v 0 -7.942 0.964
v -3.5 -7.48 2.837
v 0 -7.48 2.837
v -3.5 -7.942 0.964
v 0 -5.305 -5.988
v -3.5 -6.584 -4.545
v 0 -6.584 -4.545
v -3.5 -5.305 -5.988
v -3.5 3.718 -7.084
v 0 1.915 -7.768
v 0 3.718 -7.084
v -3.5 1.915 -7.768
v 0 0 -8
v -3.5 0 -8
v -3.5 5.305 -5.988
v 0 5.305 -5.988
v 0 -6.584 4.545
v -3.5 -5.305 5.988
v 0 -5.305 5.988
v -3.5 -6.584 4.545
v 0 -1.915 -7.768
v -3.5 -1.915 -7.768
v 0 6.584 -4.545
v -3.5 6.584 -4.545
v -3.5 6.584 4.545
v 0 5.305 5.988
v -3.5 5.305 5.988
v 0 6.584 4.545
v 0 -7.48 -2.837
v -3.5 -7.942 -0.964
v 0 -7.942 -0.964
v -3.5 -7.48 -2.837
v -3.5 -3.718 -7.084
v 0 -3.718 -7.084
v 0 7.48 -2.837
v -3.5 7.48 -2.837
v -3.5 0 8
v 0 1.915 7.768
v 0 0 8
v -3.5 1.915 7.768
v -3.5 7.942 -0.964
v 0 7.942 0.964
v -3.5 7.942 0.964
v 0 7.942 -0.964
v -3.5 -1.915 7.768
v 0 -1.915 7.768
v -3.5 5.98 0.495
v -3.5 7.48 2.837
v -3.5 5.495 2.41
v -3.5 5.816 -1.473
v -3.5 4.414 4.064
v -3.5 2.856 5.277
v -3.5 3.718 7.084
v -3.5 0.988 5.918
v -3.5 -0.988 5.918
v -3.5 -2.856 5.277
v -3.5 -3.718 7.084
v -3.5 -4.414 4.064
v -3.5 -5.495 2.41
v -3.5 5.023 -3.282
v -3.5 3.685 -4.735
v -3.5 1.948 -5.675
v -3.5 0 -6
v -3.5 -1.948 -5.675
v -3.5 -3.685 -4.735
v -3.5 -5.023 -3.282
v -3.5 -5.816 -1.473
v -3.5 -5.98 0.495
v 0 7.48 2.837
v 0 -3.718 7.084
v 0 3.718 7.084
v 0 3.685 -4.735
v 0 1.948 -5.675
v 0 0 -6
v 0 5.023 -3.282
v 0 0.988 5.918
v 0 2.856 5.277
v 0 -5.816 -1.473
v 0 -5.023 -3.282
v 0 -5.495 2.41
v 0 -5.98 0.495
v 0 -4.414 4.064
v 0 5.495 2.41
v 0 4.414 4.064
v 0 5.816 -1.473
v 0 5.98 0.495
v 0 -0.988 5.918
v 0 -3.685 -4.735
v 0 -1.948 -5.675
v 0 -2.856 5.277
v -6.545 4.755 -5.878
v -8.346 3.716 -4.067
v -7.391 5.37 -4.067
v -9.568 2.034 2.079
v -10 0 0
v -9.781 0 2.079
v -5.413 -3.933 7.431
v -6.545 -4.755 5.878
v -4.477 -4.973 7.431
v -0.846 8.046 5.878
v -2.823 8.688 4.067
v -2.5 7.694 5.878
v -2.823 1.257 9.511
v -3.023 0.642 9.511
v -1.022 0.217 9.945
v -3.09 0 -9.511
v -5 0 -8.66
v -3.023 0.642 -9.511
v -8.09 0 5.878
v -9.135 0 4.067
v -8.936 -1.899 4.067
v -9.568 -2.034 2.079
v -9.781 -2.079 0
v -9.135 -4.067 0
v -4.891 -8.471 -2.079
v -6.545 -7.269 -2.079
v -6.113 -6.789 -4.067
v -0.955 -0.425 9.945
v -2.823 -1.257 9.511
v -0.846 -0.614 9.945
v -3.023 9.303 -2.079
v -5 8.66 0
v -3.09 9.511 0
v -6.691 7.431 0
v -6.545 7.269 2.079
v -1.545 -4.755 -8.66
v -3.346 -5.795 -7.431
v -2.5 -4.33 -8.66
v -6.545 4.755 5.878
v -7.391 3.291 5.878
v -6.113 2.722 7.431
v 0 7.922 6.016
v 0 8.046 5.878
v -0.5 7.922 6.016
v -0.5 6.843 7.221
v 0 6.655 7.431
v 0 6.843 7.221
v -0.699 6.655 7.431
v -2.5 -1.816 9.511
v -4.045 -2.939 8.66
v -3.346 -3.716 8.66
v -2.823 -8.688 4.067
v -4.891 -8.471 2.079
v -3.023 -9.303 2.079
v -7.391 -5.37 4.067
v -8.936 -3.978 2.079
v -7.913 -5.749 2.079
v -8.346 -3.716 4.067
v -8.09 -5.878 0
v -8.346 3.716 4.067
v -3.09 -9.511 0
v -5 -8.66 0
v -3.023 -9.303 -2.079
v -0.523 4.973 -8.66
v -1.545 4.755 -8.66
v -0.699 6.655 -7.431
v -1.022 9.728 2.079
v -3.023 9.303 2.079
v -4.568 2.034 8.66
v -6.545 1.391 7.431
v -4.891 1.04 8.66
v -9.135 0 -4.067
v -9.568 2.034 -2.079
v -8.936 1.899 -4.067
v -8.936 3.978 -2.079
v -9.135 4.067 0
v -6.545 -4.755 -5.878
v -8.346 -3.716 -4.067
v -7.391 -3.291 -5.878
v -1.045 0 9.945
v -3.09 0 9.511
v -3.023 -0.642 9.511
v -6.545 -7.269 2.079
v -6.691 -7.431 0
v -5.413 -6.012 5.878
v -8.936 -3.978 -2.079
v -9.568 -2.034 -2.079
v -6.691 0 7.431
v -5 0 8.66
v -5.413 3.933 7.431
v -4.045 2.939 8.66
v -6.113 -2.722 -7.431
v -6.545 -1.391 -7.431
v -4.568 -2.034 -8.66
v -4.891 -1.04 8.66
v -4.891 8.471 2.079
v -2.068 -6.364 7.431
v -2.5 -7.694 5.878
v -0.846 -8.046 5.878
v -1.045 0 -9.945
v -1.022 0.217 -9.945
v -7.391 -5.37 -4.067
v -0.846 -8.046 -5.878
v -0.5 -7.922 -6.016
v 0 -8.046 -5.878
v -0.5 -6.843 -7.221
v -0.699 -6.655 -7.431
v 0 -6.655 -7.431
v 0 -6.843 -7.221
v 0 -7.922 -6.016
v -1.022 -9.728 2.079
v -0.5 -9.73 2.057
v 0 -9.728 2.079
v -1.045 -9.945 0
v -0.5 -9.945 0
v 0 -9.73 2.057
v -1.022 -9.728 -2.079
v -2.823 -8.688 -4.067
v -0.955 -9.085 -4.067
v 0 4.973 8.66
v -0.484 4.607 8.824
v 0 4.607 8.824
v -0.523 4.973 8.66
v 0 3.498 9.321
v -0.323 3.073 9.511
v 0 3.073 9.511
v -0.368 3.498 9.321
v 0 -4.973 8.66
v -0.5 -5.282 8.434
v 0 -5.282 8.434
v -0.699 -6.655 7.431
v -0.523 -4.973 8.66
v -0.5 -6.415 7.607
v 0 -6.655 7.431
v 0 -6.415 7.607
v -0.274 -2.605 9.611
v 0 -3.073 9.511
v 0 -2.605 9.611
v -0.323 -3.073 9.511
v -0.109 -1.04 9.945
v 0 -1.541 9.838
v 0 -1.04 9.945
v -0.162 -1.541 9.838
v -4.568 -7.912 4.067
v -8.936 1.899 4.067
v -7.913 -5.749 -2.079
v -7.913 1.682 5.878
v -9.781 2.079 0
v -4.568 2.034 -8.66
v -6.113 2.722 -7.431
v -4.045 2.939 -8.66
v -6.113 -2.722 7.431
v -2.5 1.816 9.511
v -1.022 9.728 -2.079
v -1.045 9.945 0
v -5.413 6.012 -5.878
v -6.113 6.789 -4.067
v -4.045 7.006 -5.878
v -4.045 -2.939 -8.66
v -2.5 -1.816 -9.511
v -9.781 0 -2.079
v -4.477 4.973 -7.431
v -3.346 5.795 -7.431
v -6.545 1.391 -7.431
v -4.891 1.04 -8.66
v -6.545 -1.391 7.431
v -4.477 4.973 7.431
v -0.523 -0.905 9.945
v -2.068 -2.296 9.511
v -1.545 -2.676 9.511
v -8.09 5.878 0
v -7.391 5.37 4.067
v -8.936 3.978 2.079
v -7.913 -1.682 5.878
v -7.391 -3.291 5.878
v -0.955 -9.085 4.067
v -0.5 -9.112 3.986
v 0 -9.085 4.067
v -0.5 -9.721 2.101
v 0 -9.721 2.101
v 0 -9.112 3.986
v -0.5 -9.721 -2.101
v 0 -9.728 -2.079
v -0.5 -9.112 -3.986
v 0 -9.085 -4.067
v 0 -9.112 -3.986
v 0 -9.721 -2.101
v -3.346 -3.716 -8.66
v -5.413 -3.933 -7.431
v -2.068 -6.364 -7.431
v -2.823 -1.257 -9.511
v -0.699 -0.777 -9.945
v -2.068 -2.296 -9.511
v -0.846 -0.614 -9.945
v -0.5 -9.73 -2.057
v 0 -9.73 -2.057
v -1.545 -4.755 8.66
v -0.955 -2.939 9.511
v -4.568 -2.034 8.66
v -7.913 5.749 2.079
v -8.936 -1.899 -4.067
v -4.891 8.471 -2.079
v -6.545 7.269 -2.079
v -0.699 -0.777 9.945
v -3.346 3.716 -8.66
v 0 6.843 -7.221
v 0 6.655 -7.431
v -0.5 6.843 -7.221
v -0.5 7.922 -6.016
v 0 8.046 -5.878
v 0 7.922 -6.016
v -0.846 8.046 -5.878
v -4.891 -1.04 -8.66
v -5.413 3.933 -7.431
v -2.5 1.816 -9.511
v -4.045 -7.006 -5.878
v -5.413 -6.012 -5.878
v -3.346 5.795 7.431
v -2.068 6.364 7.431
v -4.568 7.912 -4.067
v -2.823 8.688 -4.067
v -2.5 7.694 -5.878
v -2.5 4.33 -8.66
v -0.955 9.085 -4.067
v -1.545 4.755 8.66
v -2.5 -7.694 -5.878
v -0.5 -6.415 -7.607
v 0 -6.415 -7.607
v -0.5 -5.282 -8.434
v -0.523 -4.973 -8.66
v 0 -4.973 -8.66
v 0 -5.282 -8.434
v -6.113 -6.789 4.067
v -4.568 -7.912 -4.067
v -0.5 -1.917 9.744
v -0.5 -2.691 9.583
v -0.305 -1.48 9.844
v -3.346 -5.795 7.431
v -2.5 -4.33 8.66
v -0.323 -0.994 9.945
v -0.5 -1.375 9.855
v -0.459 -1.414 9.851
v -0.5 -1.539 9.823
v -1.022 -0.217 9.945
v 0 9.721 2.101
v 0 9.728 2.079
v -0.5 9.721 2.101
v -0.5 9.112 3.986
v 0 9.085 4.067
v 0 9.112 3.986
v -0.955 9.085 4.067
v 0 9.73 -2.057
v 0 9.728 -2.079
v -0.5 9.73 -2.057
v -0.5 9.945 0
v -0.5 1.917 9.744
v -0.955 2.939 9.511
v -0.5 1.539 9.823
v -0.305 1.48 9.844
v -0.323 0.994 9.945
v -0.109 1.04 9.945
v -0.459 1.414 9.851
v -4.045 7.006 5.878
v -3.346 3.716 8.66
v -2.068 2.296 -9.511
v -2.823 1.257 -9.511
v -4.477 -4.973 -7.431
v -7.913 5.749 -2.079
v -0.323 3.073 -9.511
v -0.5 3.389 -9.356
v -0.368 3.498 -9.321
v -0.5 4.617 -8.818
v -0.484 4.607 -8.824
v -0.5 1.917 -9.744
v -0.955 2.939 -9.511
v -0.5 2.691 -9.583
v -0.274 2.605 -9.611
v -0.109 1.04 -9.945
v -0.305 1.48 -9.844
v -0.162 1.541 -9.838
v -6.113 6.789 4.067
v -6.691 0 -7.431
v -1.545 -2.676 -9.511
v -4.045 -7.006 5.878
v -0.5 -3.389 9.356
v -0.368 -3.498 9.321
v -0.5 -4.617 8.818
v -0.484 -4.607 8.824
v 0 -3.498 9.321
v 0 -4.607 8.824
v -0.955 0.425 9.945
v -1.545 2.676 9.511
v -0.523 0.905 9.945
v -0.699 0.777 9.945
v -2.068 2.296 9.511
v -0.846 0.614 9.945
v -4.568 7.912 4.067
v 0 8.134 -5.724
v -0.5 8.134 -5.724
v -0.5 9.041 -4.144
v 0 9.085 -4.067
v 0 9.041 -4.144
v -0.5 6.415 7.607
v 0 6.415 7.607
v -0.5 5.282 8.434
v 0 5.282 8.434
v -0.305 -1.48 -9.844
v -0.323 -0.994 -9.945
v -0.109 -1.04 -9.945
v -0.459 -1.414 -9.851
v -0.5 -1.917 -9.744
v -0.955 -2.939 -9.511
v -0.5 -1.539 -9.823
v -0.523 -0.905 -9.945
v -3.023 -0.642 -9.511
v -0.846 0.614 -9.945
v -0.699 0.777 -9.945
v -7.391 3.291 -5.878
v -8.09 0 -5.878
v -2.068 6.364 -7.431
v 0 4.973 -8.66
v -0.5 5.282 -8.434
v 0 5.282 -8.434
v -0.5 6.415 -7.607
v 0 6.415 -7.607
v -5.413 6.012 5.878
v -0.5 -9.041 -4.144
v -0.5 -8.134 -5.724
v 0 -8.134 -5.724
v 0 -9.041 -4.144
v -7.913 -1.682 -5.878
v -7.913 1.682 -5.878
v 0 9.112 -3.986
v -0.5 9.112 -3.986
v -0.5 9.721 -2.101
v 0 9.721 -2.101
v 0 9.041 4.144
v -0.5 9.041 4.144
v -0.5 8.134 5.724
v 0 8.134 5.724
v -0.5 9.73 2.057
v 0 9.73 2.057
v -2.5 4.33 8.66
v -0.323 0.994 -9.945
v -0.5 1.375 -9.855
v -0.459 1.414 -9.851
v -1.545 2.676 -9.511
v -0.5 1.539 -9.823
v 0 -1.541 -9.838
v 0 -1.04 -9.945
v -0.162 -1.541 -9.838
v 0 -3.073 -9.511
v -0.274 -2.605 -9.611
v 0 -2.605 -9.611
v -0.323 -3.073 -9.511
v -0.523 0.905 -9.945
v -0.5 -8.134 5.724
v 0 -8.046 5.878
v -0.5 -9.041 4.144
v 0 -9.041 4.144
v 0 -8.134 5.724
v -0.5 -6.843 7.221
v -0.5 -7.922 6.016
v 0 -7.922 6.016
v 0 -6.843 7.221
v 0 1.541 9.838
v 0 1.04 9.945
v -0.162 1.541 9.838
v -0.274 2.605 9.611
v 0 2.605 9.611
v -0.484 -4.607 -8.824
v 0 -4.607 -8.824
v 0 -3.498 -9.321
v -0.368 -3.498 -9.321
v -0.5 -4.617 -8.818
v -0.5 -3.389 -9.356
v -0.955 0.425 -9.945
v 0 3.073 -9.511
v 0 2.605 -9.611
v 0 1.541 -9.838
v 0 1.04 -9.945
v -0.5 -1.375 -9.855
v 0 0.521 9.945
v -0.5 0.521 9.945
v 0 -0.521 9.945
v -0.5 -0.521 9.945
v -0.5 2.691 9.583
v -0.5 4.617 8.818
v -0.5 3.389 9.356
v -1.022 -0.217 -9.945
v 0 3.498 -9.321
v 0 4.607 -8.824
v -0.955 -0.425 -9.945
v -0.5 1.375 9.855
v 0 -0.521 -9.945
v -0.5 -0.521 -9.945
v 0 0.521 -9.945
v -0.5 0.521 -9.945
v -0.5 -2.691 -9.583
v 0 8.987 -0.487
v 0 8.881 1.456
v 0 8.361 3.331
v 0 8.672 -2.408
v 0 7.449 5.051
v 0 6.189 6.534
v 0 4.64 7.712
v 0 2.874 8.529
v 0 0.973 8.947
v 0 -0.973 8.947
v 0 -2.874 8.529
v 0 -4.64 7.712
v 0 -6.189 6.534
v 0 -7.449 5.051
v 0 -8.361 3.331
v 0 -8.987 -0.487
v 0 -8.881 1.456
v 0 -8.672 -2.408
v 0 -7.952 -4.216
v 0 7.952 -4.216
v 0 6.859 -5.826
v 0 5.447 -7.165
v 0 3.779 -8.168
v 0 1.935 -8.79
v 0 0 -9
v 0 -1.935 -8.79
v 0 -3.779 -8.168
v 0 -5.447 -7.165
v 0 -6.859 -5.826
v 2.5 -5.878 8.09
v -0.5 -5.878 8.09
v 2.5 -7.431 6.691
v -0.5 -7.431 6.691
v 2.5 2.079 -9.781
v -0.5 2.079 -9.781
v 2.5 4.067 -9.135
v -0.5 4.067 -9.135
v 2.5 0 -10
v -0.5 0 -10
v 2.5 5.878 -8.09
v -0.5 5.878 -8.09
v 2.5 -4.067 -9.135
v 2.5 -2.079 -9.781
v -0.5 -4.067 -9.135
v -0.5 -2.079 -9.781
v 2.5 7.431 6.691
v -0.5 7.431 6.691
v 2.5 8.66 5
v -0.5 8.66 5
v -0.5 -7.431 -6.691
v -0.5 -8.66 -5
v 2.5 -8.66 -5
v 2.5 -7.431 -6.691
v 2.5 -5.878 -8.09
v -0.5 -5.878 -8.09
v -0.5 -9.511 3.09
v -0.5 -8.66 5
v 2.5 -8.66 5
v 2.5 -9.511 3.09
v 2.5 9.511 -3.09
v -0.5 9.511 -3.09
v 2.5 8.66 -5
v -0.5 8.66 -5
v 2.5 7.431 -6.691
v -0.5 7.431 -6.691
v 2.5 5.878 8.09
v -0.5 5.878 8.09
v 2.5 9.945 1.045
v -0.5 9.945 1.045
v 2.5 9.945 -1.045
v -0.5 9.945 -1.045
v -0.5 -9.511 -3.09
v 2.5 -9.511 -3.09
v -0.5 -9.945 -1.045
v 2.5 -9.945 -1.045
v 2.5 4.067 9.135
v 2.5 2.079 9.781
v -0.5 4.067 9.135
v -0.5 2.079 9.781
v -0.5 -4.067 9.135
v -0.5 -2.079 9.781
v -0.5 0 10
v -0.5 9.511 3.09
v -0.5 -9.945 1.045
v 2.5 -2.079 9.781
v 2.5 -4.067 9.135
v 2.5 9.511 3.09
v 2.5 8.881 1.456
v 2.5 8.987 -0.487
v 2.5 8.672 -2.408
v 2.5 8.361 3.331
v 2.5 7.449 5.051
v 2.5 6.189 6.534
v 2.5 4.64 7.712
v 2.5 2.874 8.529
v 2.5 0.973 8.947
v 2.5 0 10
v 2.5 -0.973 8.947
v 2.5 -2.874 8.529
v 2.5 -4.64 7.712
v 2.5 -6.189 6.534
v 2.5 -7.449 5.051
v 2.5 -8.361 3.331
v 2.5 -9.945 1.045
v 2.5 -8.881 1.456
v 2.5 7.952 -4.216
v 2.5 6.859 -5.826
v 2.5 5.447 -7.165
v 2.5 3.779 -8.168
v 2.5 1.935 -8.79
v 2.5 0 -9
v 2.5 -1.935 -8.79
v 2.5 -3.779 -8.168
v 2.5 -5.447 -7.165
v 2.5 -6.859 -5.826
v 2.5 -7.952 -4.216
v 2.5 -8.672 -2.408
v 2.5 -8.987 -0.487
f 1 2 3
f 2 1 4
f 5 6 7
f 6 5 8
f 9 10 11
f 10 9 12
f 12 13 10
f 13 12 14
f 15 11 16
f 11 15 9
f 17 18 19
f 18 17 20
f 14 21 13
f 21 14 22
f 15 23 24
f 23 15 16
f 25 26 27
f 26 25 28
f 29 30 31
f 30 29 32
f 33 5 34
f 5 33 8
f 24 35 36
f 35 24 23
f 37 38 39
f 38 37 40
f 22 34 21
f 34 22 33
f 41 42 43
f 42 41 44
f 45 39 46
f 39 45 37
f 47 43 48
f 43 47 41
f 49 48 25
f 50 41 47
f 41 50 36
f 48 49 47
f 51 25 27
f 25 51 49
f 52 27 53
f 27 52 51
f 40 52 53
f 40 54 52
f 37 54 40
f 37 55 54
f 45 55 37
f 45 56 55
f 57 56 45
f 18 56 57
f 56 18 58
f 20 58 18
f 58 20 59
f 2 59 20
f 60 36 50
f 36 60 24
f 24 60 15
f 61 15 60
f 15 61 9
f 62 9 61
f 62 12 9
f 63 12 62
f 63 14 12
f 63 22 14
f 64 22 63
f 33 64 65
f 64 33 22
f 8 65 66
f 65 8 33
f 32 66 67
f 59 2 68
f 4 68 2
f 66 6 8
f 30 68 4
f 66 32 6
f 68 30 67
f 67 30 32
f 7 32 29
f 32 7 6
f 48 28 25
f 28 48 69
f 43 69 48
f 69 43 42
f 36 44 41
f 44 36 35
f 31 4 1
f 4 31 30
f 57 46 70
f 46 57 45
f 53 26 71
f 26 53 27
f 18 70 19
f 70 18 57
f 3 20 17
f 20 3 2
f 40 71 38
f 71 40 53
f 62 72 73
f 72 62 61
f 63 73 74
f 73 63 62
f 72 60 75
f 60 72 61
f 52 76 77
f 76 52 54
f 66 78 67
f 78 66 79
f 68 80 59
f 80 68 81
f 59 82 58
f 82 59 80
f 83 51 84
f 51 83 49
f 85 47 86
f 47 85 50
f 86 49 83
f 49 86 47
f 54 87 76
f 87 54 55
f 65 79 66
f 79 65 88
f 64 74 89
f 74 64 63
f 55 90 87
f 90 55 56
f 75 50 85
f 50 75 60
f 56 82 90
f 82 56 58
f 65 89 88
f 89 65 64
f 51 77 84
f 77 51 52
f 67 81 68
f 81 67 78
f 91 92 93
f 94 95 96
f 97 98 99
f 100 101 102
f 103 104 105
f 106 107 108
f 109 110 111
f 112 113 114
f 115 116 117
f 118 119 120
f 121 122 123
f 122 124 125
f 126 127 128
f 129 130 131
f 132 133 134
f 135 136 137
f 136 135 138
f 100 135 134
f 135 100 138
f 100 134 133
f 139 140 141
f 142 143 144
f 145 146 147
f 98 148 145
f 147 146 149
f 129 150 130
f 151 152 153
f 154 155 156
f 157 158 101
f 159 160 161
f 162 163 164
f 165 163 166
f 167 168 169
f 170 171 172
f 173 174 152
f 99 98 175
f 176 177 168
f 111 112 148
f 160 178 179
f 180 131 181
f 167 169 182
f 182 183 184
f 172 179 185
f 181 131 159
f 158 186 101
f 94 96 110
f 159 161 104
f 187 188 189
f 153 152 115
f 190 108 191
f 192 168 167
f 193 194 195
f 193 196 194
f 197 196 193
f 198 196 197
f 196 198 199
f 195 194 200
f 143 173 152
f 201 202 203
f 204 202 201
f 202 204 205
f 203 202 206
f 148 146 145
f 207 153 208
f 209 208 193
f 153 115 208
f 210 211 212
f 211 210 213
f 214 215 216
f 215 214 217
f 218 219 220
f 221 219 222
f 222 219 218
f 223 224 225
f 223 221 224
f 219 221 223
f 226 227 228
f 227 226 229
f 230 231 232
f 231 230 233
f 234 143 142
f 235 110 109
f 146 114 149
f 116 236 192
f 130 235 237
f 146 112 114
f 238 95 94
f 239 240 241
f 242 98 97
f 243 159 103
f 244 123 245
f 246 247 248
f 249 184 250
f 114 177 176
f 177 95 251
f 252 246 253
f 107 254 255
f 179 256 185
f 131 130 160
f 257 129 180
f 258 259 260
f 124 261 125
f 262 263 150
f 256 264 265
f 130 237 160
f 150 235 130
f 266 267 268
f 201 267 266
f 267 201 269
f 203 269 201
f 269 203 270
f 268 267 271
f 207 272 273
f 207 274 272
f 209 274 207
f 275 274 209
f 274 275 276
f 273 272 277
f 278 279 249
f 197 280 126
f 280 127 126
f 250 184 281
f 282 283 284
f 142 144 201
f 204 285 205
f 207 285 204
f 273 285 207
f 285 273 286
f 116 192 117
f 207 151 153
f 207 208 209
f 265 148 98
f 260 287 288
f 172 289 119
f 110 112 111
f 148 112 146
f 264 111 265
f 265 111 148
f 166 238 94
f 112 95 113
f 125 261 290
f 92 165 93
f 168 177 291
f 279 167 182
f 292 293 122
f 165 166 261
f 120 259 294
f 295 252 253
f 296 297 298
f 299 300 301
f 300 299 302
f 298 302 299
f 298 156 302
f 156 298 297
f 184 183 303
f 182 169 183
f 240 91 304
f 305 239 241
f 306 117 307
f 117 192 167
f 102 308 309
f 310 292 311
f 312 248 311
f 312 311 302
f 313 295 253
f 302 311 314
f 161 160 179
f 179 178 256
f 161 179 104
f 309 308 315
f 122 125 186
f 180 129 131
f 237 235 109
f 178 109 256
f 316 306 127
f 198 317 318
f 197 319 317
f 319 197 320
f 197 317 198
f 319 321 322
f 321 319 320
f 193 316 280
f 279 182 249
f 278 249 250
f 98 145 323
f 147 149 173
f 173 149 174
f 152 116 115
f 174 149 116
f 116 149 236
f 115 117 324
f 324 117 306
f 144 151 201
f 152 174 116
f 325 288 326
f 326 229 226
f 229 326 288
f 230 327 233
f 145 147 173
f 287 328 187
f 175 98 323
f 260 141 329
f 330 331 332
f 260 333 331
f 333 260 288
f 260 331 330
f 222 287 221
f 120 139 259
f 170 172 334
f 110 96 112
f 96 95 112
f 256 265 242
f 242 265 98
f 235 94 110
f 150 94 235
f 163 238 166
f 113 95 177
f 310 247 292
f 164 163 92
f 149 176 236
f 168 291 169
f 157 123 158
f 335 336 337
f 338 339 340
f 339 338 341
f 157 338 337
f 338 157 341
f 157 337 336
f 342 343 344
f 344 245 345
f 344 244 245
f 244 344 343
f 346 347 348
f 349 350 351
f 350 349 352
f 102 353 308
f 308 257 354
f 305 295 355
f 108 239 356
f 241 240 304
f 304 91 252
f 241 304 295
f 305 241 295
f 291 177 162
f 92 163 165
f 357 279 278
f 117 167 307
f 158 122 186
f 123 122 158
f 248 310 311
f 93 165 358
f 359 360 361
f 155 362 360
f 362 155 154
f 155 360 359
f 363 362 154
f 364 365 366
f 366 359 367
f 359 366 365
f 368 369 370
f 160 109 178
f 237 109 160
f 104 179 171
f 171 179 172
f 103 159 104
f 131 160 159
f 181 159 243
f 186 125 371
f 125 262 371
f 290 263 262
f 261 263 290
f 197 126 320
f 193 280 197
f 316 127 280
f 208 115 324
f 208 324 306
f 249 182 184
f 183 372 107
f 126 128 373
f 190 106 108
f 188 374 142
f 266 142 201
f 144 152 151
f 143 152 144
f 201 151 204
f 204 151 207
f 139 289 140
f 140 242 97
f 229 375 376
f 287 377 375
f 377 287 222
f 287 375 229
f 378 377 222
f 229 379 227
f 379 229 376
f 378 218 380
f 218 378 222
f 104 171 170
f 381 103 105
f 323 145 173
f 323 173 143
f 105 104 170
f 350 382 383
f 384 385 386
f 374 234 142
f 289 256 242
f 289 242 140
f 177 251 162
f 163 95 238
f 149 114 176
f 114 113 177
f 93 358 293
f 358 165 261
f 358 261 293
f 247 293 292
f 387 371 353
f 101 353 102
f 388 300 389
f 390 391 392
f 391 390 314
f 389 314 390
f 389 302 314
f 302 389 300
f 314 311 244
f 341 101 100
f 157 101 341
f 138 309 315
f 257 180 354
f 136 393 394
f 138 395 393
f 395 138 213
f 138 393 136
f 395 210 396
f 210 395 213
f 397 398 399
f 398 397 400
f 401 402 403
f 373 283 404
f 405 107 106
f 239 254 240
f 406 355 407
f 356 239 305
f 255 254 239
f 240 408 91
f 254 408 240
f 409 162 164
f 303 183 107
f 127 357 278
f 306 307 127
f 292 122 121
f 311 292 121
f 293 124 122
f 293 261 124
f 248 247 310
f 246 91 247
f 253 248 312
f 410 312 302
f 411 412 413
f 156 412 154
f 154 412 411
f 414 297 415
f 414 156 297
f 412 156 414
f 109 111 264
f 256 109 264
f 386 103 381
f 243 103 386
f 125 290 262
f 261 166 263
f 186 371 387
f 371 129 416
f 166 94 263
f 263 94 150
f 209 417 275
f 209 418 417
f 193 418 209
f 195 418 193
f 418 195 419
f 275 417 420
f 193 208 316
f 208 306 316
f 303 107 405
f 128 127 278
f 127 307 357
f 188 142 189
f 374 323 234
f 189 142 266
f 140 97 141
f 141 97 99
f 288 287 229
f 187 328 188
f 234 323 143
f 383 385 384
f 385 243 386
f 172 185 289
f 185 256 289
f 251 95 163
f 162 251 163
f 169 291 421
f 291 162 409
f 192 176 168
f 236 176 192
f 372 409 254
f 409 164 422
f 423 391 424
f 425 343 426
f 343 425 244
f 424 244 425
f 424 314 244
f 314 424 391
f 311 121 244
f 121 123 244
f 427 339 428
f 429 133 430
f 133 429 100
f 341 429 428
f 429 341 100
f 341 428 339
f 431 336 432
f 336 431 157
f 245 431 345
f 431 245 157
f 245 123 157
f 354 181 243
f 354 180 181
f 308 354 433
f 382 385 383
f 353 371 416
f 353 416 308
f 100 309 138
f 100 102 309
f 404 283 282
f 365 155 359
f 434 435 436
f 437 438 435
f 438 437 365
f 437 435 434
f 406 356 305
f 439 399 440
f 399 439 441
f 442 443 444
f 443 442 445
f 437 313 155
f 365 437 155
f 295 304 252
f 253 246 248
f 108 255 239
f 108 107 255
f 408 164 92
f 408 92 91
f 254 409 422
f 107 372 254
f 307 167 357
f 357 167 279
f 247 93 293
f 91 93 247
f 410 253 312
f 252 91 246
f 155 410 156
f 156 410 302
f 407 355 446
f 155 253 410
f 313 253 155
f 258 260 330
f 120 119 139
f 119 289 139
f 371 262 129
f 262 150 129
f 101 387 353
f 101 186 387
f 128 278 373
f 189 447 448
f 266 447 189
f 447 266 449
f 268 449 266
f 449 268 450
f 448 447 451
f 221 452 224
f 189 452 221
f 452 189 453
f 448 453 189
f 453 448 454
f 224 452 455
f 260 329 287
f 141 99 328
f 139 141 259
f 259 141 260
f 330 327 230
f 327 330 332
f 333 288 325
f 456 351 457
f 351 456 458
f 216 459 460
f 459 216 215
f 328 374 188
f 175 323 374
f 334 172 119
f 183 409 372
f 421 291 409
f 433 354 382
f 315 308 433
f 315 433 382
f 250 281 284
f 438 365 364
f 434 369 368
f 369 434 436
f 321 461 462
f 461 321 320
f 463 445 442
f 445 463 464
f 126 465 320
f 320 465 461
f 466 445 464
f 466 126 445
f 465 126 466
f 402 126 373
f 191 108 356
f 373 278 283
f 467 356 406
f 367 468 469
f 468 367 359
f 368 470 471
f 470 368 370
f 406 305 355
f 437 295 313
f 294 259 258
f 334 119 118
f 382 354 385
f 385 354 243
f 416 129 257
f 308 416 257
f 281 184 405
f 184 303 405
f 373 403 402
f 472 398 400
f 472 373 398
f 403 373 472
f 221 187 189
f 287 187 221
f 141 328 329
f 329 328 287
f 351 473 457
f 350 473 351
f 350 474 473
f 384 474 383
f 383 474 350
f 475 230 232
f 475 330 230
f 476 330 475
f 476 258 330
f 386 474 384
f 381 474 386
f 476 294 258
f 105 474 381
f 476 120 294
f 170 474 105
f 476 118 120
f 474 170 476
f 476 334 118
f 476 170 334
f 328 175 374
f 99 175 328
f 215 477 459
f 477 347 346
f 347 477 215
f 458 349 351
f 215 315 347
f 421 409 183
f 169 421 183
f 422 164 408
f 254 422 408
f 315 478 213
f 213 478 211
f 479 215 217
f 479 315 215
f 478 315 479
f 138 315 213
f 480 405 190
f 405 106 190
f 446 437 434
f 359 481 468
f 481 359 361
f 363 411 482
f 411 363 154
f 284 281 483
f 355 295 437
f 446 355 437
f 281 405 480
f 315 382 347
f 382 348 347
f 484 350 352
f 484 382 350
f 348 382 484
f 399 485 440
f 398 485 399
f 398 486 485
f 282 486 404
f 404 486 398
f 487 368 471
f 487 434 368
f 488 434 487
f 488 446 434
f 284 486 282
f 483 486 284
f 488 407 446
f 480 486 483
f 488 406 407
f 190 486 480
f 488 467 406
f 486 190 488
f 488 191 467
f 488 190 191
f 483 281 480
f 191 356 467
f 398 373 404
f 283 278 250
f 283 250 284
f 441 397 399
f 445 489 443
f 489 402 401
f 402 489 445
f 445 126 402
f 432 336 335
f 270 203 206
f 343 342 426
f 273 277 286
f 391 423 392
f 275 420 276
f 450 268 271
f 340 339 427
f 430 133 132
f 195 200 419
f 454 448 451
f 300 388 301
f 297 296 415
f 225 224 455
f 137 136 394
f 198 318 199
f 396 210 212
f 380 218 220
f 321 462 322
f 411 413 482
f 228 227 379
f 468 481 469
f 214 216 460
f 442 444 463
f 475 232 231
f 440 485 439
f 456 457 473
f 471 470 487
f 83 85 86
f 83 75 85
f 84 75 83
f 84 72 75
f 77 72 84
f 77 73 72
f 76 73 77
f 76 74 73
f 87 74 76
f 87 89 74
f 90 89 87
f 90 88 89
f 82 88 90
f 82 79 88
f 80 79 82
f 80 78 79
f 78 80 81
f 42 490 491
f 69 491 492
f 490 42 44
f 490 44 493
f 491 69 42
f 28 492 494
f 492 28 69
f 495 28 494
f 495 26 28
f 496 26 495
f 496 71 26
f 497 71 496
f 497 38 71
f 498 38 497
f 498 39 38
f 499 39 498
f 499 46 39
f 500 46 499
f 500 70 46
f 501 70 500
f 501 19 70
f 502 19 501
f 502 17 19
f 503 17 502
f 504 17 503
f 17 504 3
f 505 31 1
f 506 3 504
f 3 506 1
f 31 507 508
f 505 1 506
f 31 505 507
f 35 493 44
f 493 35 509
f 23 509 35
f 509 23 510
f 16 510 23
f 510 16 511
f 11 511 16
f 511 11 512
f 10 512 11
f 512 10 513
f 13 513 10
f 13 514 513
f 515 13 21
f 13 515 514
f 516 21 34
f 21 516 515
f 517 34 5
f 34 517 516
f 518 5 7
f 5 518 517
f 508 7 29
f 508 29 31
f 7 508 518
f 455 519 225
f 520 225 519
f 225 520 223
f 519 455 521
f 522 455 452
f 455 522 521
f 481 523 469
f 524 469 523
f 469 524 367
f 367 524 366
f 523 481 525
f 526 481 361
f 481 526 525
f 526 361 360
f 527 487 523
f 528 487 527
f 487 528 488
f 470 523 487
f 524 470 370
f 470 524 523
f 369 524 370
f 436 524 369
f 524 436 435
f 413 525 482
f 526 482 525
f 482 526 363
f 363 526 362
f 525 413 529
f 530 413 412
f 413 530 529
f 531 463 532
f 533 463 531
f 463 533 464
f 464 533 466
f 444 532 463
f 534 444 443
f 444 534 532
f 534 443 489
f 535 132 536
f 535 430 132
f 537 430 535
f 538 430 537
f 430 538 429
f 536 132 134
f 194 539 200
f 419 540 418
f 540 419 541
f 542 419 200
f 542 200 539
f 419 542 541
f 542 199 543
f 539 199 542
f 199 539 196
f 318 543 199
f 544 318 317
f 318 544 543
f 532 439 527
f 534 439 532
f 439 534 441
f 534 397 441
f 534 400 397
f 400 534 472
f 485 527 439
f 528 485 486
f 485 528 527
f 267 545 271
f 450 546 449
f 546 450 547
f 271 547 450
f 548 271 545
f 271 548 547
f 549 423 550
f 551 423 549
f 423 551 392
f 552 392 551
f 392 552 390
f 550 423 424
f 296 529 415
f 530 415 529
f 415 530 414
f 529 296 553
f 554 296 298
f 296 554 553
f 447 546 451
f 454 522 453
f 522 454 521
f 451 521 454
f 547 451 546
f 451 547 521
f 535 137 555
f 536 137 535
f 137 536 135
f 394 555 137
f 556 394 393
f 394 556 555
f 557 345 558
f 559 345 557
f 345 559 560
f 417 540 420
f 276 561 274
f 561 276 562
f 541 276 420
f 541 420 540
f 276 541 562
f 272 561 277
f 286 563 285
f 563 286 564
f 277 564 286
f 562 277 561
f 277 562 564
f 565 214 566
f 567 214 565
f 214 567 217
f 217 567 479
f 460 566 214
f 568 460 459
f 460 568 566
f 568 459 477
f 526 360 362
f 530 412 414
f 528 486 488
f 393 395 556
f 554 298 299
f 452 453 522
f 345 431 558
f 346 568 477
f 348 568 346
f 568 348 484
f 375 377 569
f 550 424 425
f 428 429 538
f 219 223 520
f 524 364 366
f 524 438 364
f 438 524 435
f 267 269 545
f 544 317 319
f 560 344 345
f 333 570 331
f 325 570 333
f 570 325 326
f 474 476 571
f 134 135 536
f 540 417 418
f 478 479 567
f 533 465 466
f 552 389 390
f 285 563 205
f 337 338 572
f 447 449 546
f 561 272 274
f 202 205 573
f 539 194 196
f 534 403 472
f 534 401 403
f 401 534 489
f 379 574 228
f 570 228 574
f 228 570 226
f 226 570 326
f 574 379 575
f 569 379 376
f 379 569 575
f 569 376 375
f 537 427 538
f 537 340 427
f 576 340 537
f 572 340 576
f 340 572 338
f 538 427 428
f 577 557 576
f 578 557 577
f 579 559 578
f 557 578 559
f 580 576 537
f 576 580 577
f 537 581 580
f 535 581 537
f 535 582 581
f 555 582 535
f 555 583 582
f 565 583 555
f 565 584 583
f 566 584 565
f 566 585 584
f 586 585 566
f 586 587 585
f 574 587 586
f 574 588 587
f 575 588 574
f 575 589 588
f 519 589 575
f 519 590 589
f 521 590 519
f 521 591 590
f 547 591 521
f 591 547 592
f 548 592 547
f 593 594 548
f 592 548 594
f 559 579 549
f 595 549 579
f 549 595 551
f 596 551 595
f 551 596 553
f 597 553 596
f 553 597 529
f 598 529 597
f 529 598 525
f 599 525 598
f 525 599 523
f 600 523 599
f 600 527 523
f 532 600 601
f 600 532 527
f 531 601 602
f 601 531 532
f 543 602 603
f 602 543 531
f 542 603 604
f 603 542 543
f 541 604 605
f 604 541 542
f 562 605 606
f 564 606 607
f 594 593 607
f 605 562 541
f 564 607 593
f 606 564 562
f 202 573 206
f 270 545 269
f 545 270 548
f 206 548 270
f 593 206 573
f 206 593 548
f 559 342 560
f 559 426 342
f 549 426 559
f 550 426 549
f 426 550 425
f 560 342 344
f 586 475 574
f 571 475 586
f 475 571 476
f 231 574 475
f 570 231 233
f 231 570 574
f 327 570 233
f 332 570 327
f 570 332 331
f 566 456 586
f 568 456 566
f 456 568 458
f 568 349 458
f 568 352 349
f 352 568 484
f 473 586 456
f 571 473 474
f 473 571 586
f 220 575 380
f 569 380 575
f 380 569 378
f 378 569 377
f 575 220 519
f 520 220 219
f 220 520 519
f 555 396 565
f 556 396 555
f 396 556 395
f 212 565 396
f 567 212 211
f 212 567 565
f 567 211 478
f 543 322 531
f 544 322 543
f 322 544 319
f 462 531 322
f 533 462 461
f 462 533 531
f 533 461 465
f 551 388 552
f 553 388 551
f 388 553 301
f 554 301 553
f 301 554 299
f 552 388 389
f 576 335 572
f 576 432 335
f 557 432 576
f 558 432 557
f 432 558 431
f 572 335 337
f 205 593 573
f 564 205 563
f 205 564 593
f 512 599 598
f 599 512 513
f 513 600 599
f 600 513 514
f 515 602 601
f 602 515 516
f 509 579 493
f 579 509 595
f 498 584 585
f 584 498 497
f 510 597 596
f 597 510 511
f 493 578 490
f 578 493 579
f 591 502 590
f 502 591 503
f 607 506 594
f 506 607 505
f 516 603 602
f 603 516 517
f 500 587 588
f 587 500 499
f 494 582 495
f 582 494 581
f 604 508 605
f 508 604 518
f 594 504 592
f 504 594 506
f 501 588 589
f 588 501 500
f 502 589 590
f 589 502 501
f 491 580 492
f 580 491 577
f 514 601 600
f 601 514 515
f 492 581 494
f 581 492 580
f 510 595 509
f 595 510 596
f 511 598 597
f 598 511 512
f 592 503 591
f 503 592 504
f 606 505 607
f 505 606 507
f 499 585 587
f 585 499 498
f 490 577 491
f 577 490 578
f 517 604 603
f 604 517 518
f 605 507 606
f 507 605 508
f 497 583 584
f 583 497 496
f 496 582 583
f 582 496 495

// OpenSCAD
wheel_depth=7;
inner_radius=6;

union() {
difference() {
sphere(r=10);
translate([10,0,0])
cube(20, center=true);
difference() {
rotate([0,90,0])
difference() {
cylinder(r=8,h=wheel_depth,center=true);
cylinder(r=inner_radius,h=wheel_depth,center=true);
}
}
}
translate([1,0,0])
rotate([0,90,0])
difference() {
cylinder(r=10,h=3,center=true);
cylinder(r=9,h=4,center=true);
}
}
